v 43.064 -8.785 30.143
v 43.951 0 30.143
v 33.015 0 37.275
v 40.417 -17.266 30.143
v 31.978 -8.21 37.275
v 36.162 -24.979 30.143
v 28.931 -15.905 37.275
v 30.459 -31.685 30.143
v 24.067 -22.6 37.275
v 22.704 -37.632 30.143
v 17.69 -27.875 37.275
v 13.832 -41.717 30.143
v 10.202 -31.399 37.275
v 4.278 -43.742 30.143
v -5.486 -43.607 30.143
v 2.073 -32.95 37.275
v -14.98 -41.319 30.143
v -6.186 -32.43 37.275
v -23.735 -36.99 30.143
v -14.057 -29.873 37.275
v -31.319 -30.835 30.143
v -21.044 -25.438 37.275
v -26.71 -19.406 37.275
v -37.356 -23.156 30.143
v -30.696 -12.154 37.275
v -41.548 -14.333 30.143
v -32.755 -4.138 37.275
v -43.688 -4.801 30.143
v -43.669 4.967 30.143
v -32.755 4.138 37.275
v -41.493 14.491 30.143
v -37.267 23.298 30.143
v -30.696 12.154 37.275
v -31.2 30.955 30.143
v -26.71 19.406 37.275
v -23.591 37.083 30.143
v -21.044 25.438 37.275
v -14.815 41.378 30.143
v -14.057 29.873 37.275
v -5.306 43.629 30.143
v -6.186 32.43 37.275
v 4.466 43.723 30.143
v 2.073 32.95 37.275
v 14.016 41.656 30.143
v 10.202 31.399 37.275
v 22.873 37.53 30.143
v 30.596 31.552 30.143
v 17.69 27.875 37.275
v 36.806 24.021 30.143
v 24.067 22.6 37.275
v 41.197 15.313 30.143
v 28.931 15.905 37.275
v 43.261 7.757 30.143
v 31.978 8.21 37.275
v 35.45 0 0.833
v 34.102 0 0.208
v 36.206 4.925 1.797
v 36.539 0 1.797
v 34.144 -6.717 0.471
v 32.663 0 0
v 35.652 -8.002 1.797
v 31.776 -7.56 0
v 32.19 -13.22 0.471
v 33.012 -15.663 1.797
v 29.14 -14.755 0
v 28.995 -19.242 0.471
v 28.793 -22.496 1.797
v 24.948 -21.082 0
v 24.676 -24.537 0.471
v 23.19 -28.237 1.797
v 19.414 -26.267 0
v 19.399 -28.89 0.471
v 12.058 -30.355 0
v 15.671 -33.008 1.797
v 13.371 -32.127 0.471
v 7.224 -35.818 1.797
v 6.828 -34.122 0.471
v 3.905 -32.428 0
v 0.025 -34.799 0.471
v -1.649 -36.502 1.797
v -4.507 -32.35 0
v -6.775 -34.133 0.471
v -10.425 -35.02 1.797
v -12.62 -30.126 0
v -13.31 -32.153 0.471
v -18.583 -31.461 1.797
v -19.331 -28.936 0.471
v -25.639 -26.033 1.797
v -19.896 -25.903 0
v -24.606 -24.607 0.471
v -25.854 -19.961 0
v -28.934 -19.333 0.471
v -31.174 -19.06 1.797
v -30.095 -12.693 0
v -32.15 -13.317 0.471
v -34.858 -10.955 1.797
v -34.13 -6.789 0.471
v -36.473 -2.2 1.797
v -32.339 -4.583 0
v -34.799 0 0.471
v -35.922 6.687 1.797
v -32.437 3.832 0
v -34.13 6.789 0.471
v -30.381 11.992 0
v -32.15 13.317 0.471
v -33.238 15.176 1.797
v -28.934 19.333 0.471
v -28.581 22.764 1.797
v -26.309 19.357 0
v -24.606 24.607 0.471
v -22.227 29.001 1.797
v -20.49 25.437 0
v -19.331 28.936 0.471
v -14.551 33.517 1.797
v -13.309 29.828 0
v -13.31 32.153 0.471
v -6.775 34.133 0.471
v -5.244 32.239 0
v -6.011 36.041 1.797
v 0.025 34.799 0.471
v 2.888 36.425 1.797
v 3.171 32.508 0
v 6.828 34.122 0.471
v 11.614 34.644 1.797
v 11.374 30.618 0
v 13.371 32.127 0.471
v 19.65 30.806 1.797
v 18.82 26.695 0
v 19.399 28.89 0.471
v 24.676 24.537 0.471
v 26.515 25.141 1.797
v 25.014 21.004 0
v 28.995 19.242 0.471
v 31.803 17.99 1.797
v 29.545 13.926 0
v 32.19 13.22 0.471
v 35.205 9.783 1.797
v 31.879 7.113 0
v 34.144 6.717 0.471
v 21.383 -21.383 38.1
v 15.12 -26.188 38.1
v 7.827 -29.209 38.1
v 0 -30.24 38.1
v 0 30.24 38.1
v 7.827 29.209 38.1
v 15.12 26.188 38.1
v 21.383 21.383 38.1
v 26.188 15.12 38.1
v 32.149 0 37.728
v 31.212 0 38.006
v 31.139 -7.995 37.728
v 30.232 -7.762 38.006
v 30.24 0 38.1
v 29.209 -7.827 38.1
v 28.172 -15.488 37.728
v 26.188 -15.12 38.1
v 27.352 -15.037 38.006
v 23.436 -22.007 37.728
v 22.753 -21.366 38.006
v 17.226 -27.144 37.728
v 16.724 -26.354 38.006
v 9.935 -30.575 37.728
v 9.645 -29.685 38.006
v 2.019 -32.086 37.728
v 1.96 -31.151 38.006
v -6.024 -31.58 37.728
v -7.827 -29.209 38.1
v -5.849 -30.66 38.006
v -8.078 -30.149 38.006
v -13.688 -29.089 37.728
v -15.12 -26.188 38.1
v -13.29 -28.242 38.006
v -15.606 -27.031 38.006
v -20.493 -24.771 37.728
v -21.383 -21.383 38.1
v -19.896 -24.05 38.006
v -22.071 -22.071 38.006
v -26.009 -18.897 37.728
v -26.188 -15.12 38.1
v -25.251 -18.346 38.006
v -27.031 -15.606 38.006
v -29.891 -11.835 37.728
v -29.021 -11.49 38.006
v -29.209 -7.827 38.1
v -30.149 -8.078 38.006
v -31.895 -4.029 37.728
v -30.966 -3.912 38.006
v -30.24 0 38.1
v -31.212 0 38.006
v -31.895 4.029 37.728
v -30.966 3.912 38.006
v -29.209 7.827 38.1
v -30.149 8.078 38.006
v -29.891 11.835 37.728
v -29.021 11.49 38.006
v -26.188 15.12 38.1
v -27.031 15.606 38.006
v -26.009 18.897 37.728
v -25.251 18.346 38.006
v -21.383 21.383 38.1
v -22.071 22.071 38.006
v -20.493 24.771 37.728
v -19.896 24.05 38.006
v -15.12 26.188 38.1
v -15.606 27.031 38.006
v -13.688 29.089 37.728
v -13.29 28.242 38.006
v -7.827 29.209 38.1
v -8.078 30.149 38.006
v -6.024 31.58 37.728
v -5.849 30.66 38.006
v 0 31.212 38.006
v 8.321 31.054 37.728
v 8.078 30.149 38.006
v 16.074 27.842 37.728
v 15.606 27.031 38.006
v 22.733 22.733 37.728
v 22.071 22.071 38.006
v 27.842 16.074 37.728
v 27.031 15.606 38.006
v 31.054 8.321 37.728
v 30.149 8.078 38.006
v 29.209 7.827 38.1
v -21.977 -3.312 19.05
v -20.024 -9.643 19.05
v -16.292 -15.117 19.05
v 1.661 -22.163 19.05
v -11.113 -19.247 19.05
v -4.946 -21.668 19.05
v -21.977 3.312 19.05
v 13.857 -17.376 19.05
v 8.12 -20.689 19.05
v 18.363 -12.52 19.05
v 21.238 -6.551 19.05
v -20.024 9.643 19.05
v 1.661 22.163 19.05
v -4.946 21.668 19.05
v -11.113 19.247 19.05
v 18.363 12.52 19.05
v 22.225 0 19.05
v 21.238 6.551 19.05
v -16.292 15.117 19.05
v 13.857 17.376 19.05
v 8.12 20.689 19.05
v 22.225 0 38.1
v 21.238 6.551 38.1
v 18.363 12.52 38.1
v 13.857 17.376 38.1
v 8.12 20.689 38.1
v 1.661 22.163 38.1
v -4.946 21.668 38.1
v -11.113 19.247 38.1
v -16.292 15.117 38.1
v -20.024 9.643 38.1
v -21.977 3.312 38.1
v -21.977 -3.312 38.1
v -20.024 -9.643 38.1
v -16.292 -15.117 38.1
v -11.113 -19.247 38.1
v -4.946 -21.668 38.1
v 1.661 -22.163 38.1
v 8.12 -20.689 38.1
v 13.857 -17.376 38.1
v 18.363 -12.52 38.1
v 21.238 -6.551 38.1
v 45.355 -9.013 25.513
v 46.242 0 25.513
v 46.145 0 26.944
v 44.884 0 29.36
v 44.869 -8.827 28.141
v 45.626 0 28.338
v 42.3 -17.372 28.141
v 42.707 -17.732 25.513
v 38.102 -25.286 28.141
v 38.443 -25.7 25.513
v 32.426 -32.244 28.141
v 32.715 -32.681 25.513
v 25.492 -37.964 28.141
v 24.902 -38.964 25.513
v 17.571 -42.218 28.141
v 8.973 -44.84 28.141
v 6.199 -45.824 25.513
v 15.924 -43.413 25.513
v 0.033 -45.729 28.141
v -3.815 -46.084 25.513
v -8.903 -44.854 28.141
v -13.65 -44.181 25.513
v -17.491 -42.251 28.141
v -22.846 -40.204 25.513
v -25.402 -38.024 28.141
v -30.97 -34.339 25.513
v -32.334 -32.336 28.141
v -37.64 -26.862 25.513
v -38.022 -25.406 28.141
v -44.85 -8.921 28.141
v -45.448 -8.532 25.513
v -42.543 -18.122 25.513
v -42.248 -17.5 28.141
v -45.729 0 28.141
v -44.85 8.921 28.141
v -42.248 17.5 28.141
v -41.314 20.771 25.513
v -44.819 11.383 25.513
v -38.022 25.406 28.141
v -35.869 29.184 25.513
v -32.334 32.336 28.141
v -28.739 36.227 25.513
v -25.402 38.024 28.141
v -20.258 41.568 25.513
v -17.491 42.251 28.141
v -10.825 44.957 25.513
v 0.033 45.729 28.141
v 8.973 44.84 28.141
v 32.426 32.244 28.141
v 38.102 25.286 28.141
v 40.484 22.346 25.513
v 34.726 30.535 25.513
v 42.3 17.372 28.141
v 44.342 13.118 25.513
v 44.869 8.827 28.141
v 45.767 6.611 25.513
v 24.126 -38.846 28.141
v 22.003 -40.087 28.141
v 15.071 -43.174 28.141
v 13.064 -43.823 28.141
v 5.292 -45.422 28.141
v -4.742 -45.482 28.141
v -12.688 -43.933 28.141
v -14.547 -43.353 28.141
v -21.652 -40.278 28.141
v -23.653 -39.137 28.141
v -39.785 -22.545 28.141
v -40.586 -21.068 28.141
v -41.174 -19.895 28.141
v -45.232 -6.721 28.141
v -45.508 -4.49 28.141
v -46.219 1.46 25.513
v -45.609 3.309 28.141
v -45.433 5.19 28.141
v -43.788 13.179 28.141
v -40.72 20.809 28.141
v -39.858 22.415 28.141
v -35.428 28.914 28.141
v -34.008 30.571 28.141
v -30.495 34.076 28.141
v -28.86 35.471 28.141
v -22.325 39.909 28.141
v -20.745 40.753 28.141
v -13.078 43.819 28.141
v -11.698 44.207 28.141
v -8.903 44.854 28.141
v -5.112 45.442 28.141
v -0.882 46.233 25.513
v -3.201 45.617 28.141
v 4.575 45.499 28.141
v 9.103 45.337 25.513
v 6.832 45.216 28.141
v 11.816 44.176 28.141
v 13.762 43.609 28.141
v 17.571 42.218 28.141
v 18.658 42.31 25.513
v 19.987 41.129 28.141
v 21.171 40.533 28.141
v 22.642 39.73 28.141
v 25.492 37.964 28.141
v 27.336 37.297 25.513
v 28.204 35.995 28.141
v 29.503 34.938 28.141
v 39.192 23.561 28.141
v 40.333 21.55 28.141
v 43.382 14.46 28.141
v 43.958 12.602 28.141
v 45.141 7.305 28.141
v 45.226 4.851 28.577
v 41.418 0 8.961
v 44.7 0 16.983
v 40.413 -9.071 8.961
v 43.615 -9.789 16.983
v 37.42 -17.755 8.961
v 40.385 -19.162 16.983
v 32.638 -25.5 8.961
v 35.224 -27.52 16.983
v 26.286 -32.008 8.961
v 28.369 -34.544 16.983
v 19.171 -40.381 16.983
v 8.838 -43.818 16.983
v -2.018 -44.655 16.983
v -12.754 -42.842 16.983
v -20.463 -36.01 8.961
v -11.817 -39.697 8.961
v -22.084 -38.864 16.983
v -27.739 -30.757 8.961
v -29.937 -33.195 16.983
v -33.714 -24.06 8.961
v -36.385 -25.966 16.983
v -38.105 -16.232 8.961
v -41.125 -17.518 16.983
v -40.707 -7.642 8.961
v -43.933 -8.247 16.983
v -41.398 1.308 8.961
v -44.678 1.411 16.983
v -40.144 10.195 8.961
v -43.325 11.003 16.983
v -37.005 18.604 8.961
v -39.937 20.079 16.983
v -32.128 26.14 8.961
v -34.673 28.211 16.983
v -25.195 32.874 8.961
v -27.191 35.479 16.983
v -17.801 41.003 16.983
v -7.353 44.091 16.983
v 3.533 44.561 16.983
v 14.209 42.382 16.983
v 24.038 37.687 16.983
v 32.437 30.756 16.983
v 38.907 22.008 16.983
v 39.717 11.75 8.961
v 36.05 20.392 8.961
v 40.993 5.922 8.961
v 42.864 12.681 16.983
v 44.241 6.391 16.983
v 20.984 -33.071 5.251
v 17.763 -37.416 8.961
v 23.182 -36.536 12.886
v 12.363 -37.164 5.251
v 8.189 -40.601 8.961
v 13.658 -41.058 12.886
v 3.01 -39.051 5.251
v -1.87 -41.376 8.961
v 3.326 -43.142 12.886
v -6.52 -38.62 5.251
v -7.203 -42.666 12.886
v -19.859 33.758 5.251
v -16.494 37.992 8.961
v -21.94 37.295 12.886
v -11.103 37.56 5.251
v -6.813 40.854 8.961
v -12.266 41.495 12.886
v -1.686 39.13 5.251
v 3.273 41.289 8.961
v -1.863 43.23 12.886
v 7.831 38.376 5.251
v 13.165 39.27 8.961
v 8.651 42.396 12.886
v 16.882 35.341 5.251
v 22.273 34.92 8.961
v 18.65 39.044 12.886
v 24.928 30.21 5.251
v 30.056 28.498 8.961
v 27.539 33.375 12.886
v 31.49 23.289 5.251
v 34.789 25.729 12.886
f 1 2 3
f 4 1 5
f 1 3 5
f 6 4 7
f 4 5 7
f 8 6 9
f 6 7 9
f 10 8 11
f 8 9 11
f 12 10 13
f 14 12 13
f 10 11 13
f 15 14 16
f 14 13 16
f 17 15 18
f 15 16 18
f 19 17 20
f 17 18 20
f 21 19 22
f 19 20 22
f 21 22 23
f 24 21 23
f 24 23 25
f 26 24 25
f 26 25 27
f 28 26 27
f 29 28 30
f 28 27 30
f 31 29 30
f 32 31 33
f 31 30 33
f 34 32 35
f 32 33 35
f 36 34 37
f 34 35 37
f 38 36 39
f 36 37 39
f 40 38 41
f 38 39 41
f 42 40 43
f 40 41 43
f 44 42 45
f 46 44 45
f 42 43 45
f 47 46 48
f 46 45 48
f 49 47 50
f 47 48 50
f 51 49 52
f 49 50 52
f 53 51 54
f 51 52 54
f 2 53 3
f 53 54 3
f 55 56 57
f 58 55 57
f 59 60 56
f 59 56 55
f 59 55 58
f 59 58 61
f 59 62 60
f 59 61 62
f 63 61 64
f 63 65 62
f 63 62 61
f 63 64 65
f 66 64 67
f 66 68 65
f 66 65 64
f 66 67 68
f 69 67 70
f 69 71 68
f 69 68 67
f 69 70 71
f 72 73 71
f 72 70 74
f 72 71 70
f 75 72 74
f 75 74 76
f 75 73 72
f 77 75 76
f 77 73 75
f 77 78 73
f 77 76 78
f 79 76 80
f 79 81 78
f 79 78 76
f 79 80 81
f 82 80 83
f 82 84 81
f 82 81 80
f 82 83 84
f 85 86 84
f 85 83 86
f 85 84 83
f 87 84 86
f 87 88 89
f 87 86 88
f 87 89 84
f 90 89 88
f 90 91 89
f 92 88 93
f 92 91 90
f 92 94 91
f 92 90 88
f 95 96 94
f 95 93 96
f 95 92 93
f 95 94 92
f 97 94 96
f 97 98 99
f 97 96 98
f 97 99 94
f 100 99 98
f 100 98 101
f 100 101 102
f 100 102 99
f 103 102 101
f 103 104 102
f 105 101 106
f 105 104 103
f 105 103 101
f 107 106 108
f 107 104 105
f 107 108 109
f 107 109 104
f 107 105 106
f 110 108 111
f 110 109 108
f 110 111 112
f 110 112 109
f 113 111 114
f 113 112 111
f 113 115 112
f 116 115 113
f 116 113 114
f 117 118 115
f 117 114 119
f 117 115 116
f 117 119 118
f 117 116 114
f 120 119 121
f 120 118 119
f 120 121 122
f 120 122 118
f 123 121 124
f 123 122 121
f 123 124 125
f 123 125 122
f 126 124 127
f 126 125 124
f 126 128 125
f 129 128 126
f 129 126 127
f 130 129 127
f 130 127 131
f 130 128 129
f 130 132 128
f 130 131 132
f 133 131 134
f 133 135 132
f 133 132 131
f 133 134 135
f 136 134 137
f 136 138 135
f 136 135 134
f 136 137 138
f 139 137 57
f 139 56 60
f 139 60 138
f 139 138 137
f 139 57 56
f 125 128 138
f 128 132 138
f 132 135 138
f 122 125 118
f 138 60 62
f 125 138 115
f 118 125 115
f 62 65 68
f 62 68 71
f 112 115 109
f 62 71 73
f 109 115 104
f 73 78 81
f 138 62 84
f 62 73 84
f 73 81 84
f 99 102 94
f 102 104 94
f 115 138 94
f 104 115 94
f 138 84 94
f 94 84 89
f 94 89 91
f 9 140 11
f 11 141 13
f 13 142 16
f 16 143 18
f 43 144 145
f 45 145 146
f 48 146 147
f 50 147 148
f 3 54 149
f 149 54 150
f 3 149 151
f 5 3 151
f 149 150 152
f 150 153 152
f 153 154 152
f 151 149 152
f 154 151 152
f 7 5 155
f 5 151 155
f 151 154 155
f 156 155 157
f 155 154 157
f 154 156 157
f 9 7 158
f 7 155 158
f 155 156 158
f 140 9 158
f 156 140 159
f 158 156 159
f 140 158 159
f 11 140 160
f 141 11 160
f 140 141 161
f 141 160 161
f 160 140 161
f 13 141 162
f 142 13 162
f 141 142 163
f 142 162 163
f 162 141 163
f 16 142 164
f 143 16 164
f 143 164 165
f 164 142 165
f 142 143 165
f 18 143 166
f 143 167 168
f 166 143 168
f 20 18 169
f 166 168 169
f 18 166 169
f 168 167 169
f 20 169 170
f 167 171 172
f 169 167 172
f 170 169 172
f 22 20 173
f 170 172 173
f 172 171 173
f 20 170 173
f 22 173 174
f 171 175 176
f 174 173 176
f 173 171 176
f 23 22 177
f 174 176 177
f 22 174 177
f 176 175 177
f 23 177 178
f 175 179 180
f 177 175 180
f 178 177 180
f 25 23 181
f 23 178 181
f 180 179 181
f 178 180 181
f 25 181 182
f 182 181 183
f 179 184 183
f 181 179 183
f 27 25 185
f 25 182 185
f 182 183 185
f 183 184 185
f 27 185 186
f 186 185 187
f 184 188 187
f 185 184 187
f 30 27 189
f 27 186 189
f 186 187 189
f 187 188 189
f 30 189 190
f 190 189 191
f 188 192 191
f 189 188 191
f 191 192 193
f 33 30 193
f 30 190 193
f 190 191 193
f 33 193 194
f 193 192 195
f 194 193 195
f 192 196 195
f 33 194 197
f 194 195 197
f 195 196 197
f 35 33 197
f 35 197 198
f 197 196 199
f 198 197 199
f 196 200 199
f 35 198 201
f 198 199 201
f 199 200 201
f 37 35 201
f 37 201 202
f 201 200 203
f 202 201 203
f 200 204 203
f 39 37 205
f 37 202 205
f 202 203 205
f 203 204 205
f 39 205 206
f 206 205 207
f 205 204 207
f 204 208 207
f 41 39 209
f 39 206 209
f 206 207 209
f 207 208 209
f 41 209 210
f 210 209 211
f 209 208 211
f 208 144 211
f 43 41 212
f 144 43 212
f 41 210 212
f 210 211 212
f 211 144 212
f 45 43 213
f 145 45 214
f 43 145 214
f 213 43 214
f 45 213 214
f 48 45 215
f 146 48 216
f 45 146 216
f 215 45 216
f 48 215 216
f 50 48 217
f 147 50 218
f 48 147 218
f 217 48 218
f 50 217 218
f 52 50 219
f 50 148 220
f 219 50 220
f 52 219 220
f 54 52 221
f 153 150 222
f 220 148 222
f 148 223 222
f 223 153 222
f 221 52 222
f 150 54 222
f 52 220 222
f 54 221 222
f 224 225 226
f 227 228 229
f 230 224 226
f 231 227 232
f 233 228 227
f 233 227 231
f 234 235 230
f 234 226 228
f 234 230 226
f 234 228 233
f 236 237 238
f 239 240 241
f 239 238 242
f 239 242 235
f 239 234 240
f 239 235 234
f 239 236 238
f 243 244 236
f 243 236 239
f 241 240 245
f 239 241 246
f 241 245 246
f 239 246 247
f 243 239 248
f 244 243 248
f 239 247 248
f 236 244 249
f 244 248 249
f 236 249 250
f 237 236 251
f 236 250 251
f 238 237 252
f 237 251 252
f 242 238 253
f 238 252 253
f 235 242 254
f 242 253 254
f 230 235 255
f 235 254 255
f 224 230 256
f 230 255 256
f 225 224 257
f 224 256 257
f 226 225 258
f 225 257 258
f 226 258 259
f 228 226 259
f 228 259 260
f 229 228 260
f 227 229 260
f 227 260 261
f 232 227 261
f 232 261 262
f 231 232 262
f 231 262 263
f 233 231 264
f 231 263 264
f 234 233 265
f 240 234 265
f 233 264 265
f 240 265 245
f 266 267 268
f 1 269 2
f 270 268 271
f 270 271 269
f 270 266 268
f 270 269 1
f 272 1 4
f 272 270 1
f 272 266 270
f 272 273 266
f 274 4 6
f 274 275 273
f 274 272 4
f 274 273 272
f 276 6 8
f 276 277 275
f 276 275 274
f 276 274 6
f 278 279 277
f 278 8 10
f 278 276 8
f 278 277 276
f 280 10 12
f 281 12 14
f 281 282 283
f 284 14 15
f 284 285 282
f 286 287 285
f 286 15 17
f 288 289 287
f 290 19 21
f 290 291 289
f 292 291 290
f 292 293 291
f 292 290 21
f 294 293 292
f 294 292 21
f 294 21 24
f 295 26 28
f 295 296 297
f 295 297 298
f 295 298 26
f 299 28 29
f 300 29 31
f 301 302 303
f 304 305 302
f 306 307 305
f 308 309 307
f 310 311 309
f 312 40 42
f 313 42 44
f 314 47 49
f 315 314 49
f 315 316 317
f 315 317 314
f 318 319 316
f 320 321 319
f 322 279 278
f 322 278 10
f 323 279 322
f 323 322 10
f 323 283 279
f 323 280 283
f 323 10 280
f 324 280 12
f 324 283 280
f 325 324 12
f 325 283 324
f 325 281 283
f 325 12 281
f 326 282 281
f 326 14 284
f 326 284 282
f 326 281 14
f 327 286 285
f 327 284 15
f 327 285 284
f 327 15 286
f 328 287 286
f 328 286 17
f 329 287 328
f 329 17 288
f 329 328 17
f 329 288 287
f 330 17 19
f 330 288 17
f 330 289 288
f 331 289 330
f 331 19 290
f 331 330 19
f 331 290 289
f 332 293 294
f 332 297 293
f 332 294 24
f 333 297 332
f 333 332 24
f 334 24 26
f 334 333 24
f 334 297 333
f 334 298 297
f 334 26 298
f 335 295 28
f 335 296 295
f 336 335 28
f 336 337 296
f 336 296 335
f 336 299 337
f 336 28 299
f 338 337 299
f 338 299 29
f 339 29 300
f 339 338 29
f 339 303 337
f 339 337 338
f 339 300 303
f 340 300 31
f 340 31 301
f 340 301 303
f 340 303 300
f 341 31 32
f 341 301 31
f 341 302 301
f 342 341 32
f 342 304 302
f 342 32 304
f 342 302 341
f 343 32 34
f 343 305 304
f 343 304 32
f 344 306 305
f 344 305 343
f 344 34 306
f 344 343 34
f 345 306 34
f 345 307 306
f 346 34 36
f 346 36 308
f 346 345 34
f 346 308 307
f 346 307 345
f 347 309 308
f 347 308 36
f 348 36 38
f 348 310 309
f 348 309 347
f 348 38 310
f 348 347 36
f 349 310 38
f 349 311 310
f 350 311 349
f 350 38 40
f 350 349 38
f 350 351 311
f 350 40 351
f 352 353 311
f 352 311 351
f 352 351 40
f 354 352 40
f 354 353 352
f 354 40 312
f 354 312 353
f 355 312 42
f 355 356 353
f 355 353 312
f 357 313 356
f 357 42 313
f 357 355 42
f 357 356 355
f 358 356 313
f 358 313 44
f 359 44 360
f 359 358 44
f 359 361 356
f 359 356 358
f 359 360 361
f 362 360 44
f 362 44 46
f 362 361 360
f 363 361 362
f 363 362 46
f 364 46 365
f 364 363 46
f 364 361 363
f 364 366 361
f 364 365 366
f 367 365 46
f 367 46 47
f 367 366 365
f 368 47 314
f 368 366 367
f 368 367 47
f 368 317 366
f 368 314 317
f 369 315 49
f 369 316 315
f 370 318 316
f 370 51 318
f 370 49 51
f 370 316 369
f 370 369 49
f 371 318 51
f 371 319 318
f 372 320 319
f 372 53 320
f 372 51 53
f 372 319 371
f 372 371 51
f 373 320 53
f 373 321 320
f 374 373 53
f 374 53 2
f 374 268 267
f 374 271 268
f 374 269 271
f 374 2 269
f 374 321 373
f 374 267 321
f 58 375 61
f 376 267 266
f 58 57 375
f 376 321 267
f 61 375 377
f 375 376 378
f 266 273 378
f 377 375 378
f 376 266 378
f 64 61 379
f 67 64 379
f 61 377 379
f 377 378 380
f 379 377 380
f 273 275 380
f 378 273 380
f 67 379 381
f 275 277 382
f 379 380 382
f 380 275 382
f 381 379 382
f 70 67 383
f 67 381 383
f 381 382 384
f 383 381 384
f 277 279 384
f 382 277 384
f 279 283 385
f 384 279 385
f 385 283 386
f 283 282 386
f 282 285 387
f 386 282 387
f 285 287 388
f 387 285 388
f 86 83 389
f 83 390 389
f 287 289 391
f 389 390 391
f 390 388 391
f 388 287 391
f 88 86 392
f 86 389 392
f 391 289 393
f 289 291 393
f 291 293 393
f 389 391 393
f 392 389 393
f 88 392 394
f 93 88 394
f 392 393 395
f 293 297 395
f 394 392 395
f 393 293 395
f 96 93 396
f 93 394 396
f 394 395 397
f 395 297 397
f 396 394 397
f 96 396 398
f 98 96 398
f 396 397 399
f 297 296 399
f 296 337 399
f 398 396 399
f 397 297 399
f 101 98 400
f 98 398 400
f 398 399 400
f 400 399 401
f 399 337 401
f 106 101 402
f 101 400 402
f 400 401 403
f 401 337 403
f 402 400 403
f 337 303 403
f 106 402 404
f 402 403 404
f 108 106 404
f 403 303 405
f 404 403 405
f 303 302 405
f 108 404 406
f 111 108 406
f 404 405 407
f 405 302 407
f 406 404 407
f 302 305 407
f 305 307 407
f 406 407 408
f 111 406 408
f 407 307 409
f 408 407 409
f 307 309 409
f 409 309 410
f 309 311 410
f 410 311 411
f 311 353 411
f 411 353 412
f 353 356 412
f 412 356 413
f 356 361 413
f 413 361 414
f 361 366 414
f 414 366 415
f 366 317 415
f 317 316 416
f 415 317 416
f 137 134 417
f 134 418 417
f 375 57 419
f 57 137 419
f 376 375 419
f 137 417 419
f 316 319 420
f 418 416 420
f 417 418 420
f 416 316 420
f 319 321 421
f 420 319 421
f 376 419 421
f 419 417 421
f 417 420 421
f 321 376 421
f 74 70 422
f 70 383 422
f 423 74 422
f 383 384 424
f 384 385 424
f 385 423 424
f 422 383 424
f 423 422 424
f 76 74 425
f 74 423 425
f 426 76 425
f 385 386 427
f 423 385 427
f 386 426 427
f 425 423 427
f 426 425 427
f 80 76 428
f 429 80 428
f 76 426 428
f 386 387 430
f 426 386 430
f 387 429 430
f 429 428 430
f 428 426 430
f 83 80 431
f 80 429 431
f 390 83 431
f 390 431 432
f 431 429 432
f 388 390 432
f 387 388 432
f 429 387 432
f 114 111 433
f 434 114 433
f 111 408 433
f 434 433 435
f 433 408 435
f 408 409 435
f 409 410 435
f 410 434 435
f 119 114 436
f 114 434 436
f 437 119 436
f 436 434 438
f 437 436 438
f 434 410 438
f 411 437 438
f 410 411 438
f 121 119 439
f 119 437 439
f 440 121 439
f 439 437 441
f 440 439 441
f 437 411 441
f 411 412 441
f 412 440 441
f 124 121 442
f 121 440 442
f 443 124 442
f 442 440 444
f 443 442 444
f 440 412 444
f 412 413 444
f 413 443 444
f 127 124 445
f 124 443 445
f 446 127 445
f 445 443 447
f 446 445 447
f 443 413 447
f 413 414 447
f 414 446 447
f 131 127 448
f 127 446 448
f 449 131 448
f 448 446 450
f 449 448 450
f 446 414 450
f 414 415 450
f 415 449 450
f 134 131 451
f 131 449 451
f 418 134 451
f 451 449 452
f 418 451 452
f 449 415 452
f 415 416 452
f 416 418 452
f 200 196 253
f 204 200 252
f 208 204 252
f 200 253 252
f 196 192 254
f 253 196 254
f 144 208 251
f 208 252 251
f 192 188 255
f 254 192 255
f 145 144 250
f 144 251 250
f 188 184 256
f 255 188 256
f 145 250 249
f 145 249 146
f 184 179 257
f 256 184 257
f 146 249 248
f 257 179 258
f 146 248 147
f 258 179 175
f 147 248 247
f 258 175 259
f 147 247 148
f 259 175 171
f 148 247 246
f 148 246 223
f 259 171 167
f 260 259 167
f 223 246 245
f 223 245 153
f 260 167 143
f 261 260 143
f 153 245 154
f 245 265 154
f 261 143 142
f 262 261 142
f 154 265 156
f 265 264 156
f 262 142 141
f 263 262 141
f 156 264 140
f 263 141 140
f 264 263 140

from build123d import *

# Parameters (mm, degrees)
F2_R     = 5.08
F3_R     = 22.225
F4_DEPTH = 19.05


with BuildPart() as f1:
    # F0 (on Front) → F1 (revolve)
    with BuildSketch(Plane.XZ):
        with BuildLine():
            Line((0, 38.1), (0, 0))
            Line((0, 0), (34.925, 0))
            ThreePointArc((34.925, 0), (43.391521, 13.186892), (46.355, 28.575))
            Line((46.355, 28.575), (31.75, 38.1))
            Line((31.75, 38.1), (0, 38.1))
        make_face()
    revolve(axis=Axis((0, 0, 9.574481), (0, 0, -1)))

    # F2
    f2_edges = [f1.edges().sort_by_distance(p)[0] for p in [
        (-46.355, 0, 28.575),
        (-31.75, 0, 38.1),
        (-34.925, 0, 0),
    ]]
    fillet(f2_edges, radius=F2_R)

    # F3 (on face) → F4 (cut)
    with BuildSketch(Plane.XY.offset(38.1)):
        Circle(F3_R)
    extrude(amount=-F4_DEPTH, mode=Mode.SUBTRACT)


solid = f1.part
